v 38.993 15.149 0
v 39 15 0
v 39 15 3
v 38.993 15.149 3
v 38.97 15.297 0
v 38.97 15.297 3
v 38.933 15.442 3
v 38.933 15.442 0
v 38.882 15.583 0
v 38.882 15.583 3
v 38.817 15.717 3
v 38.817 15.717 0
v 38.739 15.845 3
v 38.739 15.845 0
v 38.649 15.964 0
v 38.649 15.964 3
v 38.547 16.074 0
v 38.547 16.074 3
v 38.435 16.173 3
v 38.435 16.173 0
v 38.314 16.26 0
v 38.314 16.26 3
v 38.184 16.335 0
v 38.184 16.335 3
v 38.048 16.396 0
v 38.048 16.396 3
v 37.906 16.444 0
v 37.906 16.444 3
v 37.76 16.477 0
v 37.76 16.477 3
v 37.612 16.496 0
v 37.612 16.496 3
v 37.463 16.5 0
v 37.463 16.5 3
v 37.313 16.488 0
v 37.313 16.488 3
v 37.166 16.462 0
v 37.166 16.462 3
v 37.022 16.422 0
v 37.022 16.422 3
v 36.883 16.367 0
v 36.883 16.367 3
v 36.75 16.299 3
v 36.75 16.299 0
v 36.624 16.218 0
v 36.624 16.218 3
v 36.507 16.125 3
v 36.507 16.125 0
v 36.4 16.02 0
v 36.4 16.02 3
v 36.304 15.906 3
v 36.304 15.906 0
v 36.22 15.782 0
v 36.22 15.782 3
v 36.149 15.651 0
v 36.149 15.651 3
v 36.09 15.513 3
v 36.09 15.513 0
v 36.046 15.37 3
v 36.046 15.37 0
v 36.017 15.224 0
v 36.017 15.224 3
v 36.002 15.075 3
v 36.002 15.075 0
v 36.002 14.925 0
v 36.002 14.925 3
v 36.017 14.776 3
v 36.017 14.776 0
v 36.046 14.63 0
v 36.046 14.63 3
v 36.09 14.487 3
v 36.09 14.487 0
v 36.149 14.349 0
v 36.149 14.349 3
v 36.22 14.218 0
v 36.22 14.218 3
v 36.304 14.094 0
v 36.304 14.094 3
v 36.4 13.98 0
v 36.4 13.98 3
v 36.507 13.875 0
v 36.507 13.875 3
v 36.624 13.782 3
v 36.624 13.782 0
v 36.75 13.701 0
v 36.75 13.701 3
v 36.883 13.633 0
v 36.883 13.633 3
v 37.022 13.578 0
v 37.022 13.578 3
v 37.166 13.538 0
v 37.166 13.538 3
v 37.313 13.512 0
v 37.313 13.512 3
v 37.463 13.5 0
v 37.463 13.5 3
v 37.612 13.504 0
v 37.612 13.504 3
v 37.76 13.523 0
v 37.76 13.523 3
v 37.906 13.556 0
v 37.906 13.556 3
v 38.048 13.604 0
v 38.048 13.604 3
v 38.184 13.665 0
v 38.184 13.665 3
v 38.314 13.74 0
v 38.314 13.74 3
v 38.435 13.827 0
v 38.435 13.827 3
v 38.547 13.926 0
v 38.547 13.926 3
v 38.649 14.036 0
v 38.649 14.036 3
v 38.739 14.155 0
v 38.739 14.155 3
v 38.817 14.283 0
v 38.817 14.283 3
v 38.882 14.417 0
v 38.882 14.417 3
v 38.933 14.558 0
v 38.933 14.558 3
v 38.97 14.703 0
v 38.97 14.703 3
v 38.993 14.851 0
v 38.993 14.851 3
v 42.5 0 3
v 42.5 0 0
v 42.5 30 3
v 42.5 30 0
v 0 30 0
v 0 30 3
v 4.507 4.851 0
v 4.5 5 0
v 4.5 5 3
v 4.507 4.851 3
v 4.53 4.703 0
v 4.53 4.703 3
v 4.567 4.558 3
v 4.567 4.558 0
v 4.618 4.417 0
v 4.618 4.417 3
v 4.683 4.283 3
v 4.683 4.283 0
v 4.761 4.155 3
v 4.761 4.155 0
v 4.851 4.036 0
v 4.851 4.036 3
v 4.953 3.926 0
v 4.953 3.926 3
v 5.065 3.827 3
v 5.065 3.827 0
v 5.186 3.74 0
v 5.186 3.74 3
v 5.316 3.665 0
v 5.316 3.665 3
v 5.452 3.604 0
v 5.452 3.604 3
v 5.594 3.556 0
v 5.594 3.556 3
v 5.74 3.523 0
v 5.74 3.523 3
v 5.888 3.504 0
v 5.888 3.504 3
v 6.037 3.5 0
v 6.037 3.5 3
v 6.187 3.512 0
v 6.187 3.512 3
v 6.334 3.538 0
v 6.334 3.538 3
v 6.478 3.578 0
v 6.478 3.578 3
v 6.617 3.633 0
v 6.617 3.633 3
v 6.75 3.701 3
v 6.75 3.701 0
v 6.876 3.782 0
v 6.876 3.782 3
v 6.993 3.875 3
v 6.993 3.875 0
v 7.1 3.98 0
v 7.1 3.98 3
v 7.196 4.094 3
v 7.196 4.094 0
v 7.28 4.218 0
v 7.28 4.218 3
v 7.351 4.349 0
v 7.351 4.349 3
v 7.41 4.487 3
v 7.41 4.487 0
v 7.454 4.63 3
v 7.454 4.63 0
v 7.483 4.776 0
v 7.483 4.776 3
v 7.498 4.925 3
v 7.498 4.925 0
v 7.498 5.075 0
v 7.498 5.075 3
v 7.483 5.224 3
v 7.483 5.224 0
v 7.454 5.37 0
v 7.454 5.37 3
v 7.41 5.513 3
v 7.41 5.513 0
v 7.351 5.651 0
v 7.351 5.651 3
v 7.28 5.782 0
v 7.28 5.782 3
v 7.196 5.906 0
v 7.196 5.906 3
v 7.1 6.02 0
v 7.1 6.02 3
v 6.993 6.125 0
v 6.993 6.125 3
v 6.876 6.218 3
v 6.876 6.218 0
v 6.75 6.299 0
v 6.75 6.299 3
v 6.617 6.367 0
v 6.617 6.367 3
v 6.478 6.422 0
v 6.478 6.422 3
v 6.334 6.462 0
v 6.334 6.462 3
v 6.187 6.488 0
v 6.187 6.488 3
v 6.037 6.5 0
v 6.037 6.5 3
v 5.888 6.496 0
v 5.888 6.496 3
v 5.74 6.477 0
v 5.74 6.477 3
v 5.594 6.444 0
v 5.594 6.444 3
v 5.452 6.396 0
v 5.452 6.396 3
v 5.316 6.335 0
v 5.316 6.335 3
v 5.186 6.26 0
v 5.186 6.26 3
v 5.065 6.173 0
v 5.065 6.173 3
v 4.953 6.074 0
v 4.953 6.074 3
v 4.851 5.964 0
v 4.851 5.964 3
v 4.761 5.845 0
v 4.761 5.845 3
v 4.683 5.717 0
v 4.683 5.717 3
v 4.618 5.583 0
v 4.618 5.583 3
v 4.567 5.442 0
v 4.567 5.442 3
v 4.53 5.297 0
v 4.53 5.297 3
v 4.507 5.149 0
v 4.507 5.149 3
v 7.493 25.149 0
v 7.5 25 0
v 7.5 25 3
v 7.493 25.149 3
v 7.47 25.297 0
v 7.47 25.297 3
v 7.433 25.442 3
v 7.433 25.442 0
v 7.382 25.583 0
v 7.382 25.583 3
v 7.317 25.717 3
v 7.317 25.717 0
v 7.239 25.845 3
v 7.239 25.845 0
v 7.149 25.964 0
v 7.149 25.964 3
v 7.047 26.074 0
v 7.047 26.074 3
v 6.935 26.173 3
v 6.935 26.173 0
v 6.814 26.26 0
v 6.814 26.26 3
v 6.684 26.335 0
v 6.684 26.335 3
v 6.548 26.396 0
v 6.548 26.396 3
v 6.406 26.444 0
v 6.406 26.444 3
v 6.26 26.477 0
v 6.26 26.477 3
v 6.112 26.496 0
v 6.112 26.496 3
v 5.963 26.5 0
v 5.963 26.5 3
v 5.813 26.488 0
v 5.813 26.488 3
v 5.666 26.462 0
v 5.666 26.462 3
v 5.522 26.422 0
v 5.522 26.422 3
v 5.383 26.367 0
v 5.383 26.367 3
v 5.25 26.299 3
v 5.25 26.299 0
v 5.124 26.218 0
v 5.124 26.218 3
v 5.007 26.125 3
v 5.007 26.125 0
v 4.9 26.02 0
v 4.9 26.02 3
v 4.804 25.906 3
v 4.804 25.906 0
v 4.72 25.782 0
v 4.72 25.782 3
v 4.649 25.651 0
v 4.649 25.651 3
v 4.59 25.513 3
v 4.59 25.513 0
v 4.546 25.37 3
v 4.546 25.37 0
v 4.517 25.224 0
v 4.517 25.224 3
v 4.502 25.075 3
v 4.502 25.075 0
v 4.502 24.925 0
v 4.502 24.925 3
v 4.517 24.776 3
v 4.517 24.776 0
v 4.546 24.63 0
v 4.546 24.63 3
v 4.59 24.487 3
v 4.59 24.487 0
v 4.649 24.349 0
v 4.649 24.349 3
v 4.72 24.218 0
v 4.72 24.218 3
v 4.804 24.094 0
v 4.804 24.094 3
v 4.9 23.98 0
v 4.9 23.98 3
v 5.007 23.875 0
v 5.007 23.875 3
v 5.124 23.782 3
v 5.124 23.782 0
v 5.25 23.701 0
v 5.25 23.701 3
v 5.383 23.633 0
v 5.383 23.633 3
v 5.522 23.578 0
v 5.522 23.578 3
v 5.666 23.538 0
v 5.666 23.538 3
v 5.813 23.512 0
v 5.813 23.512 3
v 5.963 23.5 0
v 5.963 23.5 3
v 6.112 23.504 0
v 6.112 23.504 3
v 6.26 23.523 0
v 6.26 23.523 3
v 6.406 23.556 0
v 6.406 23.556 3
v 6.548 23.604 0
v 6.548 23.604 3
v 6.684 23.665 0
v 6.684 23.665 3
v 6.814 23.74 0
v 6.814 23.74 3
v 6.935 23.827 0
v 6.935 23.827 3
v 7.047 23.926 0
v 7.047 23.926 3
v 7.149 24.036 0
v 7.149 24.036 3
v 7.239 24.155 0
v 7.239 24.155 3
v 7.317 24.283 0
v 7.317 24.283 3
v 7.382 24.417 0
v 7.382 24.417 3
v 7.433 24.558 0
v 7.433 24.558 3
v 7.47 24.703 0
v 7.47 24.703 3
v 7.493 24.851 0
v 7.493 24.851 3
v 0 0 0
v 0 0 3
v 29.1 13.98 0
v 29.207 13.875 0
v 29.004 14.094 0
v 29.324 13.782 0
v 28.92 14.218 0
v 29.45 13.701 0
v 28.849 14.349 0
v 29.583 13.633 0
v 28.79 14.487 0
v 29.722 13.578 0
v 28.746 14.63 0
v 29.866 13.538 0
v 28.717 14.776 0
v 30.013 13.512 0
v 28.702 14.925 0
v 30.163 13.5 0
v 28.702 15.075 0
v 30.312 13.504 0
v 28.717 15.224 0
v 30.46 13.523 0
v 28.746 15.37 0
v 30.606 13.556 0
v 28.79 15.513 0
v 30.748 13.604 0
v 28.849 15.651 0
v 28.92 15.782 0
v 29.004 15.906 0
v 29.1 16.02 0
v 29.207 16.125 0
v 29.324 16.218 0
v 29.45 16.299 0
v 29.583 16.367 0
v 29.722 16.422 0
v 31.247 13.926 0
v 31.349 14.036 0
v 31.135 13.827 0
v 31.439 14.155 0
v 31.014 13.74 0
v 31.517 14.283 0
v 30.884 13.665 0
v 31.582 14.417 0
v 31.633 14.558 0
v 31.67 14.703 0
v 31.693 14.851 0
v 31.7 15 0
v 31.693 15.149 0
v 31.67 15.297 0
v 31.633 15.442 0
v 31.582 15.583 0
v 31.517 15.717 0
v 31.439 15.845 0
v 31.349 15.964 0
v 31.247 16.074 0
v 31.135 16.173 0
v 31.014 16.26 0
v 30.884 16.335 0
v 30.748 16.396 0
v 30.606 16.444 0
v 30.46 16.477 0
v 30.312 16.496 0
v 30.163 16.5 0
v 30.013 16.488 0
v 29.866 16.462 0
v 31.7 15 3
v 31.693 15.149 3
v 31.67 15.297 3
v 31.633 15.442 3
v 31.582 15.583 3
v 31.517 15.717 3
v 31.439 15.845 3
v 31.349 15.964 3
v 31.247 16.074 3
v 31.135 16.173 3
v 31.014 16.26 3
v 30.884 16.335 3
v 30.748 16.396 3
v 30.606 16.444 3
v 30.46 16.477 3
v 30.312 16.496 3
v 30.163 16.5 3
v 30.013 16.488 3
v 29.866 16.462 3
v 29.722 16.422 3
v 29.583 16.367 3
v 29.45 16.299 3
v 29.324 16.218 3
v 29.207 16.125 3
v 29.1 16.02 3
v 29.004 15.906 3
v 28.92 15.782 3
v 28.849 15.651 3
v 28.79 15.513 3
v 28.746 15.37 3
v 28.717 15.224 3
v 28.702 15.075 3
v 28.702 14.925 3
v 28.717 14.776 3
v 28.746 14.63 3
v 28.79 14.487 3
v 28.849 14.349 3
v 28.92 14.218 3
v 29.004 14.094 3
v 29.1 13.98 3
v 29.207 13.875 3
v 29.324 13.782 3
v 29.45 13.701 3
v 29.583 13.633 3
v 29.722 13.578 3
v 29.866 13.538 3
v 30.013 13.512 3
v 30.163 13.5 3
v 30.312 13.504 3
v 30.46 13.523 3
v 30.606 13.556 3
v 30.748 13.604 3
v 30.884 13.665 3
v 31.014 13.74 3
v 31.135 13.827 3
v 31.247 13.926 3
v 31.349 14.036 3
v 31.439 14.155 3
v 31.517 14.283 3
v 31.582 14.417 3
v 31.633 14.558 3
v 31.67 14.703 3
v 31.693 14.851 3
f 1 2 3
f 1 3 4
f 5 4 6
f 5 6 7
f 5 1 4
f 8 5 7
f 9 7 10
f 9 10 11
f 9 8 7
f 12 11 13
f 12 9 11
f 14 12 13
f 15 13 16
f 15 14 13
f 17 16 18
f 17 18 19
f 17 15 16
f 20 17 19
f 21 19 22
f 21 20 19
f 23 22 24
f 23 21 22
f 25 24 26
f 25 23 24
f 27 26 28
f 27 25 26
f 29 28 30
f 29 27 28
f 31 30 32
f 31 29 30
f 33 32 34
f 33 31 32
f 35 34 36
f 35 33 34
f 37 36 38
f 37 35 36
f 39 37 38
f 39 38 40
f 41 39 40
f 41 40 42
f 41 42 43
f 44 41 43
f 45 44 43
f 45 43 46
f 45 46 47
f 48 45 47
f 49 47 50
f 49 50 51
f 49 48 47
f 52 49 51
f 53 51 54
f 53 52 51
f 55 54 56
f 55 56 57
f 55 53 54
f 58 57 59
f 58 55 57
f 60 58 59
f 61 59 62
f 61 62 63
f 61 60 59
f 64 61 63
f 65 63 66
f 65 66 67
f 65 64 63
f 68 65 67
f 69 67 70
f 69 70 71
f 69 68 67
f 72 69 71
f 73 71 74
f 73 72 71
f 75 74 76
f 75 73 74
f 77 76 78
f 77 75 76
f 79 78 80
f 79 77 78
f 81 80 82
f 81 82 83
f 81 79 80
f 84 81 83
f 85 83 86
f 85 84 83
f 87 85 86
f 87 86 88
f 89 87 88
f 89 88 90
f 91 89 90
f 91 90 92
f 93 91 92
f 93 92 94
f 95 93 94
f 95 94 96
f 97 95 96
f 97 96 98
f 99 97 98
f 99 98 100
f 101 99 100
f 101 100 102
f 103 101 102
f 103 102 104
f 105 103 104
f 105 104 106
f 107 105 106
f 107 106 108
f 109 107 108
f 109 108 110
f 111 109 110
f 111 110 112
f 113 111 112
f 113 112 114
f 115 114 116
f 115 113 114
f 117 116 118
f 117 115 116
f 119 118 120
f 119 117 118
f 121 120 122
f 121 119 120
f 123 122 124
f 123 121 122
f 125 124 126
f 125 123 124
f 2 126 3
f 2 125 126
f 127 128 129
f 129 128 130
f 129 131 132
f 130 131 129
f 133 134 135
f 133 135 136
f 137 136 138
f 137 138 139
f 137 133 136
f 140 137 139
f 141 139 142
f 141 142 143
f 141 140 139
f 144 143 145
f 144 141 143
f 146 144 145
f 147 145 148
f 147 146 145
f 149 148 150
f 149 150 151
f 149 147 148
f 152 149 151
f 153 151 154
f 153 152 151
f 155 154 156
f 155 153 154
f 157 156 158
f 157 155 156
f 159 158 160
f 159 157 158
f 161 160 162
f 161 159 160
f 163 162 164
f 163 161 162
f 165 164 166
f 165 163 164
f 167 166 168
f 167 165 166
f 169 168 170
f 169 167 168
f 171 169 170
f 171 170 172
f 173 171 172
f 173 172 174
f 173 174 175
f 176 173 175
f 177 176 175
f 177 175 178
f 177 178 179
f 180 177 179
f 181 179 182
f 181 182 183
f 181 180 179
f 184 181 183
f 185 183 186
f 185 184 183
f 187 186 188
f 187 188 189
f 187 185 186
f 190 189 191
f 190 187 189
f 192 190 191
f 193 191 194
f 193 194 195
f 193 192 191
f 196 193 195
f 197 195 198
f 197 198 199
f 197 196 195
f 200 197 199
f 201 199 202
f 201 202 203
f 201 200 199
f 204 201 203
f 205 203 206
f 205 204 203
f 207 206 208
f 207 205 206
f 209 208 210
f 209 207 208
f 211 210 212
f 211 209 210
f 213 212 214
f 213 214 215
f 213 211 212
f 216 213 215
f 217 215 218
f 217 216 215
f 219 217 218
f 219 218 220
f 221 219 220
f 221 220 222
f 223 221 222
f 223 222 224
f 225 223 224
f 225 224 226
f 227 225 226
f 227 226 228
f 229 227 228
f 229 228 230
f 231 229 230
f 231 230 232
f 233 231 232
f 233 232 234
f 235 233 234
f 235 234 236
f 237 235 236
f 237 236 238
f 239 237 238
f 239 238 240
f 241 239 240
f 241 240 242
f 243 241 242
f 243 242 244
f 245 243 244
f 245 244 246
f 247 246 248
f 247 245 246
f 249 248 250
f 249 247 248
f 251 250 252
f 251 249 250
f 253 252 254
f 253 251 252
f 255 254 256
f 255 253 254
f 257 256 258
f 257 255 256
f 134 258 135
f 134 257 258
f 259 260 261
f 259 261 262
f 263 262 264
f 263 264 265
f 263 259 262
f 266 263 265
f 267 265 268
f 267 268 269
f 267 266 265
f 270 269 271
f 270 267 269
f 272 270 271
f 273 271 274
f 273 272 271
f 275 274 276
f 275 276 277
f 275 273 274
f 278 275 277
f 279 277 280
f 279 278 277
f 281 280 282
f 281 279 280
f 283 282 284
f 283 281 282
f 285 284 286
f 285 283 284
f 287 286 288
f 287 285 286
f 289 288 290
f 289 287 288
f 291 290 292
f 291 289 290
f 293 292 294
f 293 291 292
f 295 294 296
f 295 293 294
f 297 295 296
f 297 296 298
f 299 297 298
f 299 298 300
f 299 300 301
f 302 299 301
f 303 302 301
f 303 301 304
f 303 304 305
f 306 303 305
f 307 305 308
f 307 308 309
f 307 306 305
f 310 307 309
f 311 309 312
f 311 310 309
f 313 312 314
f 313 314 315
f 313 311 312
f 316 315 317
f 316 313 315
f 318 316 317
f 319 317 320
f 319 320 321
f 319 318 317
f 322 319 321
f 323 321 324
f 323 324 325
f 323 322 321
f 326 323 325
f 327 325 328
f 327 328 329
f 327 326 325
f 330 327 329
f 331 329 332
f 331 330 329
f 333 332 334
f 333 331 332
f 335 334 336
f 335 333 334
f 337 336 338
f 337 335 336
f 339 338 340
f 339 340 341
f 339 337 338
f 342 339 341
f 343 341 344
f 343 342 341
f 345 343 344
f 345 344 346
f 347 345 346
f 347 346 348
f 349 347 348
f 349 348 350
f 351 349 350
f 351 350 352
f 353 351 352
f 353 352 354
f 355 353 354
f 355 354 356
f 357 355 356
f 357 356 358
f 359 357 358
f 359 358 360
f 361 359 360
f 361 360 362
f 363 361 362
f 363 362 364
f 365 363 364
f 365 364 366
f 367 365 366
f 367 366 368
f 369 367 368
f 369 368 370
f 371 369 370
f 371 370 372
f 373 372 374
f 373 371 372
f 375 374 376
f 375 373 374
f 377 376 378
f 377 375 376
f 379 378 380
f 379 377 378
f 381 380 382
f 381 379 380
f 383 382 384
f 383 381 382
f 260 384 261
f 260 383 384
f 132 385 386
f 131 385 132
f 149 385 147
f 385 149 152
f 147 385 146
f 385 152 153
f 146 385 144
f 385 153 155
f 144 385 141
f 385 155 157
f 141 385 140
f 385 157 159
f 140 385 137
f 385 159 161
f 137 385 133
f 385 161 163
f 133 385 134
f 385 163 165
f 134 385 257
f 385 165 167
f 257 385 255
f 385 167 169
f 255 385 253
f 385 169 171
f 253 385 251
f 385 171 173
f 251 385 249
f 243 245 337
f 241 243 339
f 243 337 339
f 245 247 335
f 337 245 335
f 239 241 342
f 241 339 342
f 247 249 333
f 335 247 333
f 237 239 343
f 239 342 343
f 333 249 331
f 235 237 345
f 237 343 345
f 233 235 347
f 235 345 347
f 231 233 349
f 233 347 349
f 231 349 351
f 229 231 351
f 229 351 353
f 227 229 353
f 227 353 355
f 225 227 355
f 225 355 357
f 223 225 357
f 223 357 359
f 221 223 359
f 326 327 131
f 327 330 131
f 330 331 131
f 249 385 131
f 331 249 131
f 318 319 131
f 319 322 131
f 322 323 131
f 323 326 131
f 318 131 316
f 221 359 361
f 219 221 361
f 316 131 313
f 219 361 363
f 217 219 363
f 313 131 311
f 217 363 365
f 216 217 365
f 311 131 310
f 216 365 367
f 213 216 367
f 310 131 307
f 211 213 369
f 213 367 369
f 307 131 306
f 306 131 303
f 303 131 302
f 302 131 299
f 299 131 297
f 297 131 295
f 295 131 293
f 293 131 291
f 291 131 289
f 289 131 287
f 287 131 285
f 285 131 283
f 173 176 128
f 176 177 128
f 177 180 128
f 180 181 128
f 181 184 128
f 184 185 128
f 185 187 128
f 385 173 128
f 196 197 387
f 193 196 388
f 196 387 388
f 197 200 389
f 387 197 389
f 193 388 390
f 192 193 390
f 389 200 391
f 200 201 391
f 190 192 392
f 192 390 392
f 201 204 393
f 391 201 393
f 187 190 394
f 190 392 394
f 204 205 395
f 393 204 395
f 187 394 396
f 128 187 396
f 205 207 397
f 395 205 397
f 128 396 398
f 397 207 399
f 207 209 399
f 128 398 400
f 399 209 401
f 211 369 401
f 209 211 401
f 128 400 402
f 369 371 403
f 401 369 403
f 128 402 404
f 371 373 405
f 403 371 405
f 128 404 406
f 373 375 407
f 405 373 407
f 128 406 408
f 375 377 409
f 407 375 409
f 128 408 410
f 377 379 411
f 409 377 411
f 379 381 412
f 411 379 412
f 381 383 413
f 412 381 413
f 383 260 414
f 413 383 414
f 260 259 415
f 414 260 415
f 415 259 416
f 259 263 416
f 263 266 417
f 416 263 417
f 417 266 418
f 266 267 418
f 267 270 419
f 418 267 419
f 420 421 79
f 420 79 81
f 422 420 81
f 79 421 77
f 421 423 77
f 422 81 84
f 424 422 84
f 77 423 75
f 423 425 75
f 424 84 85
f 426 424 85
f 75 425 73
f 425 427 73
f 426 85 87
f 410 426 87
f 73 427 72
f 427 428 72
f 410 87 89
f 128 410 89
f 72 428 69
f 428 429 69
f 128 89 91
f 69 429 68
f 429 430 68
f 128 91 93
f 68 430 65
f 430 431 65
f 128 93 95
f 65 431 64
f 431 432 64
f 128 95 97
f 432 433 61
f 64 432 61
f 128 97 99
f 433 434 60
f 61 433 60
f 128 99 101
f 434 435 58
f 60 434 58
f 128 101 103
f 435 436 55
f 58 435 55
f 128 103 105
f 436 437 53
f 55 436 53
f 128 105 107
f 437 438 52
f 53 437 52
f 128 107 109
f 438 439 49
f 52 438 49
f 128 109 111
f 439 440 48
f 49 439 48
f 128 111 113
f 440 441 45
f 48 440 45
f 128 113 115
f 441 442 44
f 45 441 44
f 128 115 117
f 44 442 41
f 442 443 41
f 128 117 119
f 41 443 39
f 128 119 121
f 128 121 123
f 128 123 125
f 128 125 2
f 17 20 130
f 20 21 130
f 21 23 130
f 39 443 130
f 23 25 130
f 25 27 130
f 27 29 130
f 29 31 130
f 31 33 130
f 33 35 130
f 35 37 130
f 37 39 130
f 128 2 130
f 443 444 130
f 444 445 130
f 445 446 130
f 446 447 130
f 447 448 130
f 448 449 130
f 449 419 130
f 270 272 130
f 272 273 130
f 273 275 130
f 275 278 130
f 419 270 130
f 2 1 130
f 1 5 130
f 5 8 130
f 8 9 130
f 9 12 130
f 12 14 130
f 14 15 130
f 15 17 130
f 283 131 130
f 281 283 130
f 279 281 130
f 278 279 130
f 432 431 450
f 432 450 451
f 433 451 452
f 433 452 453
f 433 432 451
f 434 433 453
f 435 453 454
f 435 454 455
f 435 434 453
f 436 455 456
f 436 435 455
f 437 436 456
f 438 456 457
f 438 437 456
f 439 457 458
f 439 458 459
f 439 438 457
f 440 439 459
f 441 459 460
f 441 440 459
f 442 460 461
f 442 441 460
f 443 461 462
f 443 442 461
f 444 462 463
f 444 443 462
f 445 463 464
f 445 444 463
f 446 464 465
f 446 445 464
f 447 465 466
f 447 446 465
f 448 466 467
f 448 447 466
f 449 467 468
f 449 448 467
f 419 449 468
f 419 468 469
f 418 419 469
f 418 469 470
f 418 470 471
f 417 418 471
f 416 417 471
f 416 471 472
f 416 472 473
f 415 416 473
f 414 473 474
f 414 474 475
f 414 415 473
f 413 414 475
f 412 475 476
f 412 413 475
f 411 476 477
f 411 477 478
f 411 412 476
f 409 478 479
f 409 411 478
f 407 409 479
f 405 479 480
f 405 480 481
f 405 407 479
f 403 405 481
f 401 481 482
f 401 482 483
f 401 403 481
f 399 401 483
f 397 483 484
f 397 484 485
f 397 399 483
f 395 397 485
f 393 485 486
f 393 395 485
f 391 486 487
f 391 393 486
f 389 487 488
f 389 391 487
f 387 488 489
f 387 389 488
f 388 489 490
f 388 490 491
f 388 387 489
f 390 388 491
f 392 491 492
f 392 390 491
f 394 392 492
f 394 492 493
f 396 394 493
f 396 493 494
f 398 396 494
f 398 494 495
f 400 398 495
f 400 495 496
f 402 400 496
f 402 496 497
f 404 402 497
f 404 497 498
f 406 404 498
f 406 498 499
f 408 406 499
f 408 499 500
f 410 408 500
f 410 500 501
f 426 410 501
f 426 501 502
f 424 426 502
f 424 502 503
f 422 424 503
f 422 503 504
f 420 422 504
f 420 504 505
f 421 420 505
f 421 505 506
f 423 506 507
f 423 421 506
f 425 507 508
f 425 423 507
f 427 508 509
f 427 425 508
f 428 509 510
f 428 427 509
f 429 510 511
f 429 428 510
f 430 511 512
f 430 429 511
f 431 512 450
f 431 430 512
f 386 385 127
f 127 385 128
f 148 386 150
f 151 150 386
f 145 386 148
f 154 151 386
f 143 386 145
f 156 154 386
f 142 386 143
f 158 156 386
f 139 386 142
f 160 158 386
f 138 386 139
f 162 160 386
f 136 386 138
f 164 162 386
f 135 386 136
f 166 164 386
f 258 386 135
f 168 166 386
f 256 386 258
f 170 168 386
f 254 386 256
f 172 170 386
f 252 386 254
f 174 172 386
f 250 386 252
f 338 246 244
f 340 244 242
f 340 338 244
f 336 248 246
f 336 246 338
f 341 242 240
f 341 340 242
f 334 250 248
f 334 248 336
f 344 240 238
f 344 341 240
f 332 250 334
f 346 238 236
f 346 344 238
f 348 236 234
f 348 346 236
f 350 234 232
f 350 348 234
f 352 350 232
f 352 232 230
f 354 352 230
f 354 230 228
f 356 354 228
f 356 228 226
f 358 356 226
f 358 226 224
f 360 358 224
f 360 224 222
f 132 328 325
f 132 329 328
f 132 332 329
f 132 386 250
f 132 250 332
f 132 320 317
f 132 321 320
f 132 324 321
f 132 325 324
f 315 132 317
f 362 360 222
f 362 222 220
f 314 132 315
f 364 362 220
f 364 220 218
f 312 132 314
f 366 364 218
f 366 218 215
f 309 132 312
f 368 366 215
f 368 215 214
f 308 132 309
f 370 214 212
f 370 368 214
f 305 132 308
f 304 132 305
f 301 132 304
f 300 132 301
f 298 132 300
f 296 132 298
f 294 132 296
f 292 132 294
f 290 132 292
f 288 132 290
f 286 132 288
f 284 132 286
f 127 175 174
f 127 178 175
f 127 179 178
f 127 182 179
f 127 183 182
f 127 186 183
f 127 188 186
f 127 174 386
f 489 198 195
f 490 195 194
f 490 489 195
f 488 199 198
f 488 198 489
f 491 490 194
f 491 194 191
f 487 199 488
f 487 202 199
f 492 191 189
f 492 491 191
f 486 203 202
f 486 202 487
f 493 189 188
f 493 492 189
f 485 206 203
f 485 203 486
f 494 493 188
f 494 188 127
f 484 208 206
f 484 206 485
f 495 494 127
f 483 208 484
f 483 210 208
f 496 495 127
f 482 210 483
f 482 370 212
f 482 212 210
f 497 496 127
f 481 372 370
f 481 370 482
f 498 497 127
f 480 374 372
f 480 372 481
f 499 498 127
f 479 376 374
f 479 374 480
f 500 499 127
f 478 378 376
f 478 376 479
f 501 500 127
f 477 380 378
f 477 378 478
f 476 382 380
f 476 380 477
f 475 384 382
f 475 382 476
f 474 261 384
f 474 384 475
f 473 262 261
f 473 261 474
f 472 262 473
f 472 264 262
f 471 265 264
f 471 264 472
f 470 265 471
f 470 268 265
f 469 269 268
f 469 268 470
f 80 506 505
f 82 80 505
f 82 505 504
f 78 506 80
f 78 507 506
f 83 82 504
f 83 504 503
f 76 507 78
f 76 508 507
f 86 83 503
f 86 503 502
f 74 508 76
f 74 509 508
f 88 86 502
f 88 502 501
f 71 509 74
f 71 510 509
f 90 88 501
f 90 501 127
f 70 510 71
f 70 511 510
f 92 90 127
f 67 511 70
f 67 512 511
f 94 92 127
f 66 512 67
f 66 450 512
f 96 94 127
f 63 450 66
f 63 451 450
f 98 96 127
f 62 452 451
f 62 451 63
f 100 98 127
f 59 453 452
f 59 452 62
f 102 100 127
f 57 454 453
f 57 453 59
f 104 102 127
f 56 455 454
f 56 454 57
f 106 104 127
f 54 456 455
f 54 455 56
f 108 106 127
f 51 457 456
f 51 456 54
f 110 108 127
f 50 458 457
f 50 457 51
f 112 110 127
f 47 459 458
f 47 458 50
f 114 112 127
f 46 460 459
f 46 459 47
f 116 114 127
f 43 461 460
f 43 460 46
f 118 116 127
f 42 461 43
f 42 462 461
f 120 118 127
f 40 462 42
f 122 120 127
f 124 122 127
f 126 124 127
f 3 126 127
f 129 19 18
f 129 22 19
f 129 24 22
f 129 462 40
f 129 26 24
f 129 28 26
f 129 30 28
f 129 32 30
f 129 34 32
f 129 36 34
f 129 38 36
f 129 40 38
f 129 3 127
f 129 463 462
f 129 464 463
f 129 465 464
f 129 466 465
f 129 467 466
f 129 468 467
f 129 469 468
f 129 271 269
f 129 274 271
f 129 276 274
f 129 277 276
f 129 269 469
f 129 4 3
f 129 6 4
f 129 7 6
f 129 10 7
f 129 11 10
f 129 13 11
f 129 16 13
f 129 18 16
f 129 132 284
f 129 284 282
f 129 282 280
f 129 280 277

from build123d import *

# Parameters (mm, degrees)
CROQUIS1_W              = 42.5
CROQUIS1_H              = 30
CROQUIS1_R              = 1.5
SALIENTE_EXTRUIR1_DEPTH = 3


with BuildPart() as part:
    # Croquis1 → Saliente-Extruir1 (new body)
    with BuildSketch(Plane.XY):
        with Locations((21.25, 15)):
            Rectangle(CROQUIS1_W, CROQUIS1_H)
        with Locations((6, 25)):
            Circle(CROQUIS1_R, mode=Mode.SUBTRACT)
        with Locations(Location((6, 5, 0), (0, 0, 180))):
            Circle(CROQUIS1_R, mode=Mode.SUBTRACT)
        with Locations((37.5, 15)):
            Circle(CROQUIS1_R, mode=Mode.SUBTRACT)
        with Locations((30.2, 15)):
            Circle(CROQUIS1_R, mode=Mode.SUBTRACT)
    extrude(amount=SALIENTE_EXTRUIR1_DEPTH)


solid = part.part
